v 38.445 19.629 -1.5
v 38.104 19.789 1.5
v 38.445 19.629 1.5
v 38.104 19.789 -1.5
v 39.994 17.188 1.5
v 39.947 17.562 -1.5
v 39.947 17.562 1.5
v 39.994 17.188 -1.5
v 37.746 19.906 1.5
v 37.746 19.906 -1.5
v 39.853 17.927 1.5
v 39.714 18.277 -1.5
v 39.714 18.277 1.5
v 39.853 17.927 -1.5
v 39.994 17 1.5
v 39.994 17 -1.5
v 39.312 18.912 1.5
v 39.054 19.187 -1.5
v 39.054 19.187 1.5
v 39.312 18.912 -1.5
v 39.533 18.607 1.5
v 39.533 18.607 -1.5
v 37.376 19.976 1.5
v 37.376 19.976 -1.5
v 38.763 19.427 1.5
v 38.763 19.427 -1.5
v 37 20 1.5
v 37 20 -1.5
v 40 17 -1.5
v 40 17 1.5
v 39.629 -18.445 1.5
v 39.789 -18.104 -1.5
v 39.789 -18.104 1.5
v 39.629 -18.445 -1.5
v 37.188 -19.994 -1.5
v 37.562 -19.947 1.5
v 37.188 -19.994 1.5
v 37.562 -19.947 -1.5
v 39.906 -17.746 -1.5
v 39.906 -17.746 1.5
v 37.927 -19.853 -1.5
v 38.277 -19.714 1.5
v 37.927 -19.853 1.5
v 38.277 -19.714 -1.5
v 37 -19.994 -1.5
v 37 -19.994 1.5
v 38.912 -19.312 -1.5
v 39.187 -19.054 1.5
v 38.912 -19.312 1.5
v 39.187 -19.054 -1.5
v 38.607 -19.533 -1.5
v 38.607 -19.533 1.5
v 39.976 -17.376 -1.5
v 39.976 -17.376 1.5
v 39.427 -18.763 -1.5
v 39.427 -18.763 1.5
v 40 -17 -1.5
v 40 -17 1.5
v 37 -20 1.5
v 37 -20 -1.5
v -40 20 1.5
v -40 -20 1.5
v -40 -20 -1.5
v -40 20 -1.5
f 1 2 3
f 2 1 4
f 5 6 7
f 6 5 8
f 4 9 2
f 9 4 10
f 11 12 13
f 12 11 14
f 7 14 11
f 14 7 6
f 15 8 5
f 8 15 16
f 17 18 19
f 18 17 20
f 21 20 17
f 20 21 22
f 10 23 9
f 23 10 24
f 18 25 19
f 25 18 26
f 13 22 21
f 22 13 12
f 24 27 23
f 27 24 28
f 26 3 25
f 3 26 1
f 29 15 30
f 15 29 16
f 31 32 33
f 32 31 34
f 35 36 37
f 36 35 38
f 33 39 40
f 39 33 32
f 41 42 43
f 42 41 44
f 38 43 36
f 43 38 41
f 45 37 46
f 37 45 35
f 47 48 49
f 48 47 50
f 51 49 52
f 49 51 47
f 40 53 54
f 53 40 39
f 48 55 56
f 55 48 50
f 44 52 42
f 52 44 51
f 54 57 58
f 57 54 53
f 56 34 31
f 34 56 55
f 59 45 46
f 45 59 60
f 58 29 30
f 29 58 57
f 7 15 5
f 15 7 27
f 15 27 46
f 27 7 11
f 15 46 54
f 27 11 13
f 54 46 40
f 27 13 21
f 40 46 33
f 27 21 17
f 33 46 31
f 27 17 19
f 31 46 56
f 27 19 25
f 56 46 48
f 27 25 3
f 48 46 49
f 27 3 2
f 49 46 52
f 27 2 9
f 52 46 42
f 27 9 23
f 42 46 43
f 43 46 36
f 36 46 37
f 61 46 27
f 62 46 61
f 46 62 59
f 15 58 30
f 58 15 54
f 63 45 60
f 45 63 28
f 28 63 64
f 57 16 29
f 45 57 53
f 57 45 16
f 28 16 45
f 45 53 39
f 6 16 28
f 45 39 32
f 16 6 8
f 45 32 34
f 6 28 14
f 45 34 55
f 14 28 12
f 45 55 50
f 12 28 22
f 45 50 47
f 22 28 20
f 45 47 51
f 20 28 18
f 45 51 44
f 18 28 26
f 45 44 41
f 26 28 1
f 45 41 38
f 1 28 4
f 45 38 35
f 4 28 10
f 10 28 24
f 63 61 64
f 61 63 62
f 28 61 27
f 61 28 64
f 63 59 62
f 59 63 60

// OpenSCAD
// file: round_corner_mask.scad
// Copyright (c) 2014 Jérémie DECOCK <jd.jdhp@gmail.com>

module round_corner_mask(radius, spacing_x, spacing_y, height) {
	$fn=50;
	
    difference() {
        cube([2*radius+1, 2*radius+1, height], center=true);
        union() {
            cylinder(r=radius, h=height+2, center=true);
            translate([(radius+2)/2, 0, 0]) cube([radius+2, 2*radius+2, height+2], center=true);
            translate([0, (radius+2)/2, 0]) cube([2*radius+2, radius+2, height+2], center=true);
        }
    }
}

module board_round_4_corner_mask(radius, width, depth, height) {
    spacing_x = width - 2 * radius;
    spacing_y = depth - 2 * radius;
    height = height + 1;

    translate([-spacing_x/2,  spacing_y/2, 0]) mirror([0,1,0]) round_corner_mask(radius, spacing_x, spacing_y, height);
    translate([-spacing_x/2, -spacing_y/2, 0]) mirror([0,0,0]) round_corner_mask(radius, spacing_x, spacing_y, height);
    translate([ spacing_x/2,  spacing_y/2, 0]) mirror([1,1,0]) round_corner_mask(radius, spacing_x, spacing_y, height);
    translate([ spacing_x/2, -spacing_y/2, 0]) mirror([1,0,0]) round_corner_mask(radius, spacing_x, spacing_y, height);
}

module board_round_2_corner_mask(radius, width, depth, height) {
    spacing_x = width - 2 * radius;
    spacing_y = depth - 2 * radius;
    height = height + 1;

    translate([ spacing_x/2,  spacing_y/2, 0]) mirror([1,1,0]) round_corner_mask(radius, spacing_x, spacing_y, height);
    translate([ spacing_x/2, -spacing_y/2, 0]) mirror([1,0,0]) round_corner_mask(radius, spacing_x, spacing_y, height);
}
// main file
// Rounded board

// Copyright (c) 2014 Jérémie DECOCK <jd.jdhp@gmail.com>

use <round_corner_mask.scad>

/////////////////////////////////////////////

module 4_rounded_corners_board(board_width, board_depth, board_height, board_corner_radius) {
    difference() {
        cube([board_width, board_depth, board_height], center=true);
        #board_round_4_corner_mask(radius=board_corner_radius, width=board_width, depth=board_depth, height=board_height);
    }
}

module 2_rounded_corners_board(board_width, board_depth, board_height, board_corner_radius) {
    difference() {
        cube([board_width, board_depth, board_height], center=true);
        #board_round_2_corner_mask(radius=board_corner_radius, width=board_width, depth=board_depth, height=board_height);
    }
}

//4_rounded_corners_board(board_width=80, board_depth=40, board_height=3, board_corner_radius=3);
2_rounded_corners_board(board_width=80, board_depth=40, board_height=3, board_corner_radius=3);
